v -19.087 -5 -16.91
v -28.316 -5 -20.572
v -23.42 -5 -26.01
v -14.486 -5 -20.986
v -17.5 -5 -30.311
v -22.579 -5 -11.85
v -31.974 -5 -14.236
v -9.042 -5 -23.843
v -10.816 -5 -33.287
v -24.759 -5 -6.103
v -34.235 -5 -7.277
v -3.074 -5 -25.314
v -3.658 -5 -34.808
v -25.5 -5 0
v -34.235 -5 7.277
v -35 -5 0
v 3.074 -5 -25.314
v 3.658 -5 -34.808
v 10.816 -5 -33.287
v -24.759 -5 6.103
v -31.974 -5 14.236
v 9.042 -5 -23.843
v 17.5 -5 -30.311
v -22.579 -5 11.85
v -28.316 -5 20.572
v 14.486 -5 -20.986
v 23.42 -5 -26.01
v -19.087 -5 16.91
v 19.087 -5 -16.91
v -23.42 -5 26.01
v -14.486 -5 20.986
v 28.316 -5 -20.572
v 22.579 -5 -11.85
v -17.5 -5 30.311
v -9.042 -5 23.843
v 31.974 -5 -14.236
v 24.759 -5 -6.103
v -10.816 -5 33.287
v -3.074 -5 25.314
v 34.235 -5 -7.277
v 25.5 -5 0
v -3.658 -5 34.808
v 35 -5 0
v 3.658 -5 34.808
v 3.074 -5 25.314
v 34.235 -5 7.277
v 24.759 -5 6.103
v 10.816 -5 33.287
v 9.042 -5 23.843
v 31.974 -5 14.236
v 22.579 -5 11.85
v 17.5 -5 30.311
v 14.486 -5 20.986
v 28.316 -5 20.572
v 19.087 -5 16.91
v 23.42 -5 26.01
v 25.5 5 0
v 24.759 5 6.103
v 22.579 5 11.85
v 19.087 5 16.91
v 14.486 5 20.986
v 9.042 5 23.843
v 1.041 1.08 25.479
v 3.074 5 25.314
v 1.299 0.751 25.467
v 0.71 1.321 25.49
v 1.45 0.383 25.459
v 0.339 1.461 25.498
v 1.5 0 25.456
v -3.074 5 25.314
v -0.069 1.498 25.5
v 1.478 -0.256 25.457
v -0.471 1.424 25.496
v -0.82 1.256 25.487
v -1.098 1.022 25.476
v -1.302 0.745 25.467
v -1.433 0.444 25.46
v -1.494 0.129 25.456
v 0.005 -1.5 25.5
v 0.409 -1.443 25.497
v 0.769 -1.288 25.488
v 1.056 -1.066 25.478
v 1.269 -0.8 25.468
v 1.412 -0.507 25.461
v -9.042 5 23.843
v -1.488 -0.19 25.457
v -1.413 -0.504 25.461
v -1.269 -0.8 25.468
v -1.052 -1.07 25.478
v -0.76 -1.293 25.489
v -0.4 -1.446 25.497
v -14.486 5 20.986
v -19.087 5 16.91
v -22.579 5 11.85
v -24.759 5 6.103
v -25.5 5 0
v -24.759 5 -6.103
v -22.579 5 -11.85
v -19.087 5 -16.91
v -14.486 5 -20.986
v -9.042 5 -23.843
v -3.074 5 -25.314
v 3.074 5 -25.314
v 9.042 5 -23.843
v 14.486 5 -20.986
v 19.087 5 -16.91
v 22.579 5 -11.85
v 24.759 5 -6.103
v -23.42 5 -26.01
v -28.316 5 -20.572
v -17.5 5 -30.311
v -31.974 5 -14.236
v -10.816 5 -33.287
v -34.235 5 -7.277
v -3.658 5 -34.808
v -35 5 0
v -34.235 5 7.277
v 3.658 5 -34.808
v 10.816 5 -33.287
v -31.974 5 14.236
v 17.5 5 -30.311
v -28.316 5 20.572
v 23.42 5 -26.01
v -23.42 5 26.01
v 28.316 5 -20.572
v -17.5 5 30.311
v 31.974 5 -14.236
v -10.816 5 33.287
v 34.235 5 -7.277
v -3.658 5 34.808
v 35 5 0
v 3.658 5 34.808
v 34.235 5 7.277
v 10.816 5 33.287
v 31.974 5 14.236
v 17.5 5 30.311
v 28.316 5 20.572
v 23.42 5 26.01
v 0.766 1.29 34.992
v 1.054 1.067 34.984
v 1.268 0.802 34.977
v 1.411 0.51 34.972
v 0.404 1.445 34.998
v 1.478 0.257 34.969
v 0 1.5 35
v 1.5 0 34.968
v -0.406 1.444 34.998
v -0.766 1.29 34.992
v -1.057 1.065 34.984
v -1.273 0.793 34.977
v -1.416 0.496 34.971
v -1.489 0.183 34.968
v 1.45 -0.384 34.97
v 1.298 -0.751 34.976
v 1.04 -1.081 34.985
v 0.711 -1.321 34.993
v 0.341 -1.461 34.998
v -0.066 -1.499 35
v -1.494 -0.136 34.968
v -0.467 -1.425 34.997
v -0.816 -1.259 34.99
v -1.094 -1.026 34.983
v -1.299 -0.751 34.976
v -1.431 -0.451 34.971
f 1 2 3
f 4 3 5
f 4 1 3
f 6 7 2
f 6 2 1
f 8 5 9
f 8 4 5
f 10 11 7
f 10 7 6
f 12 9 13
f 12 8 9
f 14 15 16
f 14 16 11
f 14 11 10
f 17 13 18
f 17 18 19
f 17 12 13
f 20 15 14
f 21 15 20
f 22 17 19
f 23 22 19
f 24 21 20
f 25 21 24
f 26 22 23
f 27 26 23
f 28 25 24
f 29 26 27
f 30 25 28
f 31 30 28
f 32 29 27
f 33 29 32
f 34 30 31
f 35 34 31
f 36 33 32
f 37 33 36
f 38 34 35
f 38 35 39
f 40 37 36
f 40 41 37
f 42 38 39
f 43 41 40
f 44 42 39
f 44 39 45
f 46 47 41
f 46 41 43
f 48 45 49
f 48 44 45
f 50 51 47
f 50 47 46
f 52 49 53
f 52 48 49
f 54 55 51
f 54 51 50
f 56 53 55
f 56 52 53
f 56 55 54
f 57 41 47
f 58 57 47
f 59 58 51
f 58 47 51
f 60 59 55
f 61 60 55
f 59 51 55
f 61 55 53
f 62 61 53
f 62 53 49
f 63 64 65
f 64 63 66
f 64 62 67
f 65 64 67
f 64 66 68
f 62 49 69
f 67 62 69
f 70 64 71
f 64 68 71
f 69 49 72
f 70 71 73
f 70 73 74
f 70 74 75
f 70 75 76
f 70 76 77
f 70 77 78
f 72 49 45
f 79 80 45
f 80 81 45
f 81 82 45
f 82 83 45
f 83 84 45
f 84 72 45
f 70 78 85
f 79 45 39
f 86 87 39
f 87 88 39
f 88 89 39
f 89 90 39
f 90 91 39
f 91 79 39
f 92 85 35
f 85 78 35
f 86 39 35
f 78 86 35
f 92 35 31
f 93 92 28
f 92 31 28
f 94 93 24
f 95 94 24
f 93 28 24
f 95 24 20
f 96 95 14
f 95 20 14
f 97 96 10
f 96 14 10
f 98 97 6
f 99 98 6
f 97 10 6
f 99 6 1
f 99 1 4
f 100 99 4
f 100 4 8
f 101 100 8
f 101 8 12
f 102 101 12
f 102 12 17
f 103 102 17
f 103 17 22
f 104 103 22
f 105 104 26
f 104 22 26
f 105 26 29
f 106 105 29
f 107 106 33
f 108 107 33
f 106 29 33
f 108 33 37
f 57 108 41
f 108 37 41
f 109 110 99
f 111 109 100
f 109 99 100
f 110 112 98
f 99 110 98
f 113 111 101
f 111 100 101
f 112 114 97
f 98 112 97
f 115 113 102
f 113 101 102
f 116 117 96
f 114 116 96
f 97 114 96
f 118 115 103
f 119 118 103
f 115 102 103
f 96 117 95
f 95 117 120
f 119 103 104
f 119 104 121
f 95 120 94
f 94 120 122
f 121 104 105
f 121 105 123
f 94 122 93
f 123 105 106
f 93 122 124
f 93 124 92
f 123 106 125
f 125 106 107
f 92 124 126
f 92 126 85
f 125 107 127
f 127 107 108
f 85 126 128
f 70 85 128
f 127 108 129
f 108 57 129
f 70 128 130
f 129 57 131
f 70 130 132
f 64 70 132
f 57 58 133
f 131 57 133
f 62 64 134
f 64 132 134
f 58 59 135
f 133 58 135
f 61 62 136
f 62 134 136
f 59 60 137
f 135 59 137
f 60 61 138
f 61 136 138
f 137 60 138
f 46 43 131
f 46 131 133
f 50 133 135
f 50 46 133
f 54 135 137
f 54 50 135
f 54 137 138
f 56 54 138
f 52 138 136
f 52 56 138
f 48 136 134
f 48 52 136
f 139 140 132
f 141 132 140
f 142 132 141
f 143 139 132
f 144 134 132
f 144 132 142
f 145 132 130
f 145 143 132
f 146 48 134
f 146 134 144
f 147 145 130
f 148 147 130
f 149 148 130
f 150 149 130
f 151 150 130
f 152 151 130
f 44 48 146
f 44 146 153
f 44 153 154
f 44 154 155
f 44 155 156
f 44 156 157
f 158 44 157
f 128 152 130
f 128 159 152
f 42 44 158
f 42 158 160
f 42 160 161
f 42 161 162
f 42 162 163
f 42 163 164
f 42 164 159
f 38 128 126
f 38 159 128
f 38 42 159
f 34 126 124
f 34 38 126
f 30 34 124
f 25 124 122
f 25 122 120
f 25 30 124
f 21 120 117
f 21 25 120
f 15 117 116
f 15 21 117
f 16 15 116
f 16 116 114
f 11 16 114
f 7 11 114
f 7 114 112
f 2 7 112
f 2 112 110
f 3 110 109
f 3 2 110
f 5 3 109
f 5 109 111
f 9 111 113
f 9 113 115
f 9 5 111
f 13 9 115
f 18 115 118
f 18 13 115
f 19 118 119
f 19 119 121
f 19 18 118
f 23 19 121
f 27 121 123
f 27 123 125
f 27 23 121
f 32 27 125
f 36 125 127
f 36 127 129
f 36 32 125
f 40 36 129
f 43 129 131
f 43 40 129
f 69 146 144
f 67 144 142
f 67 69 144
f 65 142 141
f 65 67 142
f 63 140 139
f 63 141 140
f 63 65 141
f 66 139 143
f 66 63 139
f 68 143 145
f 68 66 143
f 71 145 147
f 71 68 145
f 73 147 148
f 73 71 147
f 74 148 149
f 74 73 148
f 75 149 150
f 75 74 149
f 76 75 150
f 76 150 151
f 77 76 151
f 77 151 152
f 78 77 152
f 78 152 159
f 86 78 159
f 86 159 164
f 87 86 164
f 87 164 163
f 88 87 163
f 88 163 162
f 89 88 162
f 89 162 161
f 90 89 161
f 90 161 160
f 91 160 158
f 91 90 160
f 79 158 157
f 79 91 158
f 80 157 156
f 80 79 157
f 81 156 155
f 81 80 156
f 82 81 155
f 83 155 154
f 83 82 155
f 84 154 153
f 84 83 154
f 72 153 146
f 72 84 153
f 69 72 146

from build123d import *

# Parameters (mm, degrees)
F0_R     = 35
F1_DEPTH = 5
F2_R     = 25.5
F3_DEPTH = 5
F4_R     = 1.5
F5_DEPTH = 35


with BuildPart() as f1:
    # F0 (on Front) → F1 (new body, symmetric)
    with BuildSketch(Plane.XZ):
        Circle(F0_R)
    extrude(amount=F1_DEPTH, both=True)

    # F2 (on face) → F3 (cut, symmetric)
    with BuildSketch(Plane.XZ):
        Circle(F2_R)
    extrude(amount=F3_DEPTH, both=True, mode=Mode.SUBTRACT)

    # F4 (on Top) → F5 (cut)
    with BuildSketch(Plane.XY):
        Circle(F4_R)
    extrude(amount=F5_DEPTH, mode=Mode.SUBTRACT)


solid = f1.part
